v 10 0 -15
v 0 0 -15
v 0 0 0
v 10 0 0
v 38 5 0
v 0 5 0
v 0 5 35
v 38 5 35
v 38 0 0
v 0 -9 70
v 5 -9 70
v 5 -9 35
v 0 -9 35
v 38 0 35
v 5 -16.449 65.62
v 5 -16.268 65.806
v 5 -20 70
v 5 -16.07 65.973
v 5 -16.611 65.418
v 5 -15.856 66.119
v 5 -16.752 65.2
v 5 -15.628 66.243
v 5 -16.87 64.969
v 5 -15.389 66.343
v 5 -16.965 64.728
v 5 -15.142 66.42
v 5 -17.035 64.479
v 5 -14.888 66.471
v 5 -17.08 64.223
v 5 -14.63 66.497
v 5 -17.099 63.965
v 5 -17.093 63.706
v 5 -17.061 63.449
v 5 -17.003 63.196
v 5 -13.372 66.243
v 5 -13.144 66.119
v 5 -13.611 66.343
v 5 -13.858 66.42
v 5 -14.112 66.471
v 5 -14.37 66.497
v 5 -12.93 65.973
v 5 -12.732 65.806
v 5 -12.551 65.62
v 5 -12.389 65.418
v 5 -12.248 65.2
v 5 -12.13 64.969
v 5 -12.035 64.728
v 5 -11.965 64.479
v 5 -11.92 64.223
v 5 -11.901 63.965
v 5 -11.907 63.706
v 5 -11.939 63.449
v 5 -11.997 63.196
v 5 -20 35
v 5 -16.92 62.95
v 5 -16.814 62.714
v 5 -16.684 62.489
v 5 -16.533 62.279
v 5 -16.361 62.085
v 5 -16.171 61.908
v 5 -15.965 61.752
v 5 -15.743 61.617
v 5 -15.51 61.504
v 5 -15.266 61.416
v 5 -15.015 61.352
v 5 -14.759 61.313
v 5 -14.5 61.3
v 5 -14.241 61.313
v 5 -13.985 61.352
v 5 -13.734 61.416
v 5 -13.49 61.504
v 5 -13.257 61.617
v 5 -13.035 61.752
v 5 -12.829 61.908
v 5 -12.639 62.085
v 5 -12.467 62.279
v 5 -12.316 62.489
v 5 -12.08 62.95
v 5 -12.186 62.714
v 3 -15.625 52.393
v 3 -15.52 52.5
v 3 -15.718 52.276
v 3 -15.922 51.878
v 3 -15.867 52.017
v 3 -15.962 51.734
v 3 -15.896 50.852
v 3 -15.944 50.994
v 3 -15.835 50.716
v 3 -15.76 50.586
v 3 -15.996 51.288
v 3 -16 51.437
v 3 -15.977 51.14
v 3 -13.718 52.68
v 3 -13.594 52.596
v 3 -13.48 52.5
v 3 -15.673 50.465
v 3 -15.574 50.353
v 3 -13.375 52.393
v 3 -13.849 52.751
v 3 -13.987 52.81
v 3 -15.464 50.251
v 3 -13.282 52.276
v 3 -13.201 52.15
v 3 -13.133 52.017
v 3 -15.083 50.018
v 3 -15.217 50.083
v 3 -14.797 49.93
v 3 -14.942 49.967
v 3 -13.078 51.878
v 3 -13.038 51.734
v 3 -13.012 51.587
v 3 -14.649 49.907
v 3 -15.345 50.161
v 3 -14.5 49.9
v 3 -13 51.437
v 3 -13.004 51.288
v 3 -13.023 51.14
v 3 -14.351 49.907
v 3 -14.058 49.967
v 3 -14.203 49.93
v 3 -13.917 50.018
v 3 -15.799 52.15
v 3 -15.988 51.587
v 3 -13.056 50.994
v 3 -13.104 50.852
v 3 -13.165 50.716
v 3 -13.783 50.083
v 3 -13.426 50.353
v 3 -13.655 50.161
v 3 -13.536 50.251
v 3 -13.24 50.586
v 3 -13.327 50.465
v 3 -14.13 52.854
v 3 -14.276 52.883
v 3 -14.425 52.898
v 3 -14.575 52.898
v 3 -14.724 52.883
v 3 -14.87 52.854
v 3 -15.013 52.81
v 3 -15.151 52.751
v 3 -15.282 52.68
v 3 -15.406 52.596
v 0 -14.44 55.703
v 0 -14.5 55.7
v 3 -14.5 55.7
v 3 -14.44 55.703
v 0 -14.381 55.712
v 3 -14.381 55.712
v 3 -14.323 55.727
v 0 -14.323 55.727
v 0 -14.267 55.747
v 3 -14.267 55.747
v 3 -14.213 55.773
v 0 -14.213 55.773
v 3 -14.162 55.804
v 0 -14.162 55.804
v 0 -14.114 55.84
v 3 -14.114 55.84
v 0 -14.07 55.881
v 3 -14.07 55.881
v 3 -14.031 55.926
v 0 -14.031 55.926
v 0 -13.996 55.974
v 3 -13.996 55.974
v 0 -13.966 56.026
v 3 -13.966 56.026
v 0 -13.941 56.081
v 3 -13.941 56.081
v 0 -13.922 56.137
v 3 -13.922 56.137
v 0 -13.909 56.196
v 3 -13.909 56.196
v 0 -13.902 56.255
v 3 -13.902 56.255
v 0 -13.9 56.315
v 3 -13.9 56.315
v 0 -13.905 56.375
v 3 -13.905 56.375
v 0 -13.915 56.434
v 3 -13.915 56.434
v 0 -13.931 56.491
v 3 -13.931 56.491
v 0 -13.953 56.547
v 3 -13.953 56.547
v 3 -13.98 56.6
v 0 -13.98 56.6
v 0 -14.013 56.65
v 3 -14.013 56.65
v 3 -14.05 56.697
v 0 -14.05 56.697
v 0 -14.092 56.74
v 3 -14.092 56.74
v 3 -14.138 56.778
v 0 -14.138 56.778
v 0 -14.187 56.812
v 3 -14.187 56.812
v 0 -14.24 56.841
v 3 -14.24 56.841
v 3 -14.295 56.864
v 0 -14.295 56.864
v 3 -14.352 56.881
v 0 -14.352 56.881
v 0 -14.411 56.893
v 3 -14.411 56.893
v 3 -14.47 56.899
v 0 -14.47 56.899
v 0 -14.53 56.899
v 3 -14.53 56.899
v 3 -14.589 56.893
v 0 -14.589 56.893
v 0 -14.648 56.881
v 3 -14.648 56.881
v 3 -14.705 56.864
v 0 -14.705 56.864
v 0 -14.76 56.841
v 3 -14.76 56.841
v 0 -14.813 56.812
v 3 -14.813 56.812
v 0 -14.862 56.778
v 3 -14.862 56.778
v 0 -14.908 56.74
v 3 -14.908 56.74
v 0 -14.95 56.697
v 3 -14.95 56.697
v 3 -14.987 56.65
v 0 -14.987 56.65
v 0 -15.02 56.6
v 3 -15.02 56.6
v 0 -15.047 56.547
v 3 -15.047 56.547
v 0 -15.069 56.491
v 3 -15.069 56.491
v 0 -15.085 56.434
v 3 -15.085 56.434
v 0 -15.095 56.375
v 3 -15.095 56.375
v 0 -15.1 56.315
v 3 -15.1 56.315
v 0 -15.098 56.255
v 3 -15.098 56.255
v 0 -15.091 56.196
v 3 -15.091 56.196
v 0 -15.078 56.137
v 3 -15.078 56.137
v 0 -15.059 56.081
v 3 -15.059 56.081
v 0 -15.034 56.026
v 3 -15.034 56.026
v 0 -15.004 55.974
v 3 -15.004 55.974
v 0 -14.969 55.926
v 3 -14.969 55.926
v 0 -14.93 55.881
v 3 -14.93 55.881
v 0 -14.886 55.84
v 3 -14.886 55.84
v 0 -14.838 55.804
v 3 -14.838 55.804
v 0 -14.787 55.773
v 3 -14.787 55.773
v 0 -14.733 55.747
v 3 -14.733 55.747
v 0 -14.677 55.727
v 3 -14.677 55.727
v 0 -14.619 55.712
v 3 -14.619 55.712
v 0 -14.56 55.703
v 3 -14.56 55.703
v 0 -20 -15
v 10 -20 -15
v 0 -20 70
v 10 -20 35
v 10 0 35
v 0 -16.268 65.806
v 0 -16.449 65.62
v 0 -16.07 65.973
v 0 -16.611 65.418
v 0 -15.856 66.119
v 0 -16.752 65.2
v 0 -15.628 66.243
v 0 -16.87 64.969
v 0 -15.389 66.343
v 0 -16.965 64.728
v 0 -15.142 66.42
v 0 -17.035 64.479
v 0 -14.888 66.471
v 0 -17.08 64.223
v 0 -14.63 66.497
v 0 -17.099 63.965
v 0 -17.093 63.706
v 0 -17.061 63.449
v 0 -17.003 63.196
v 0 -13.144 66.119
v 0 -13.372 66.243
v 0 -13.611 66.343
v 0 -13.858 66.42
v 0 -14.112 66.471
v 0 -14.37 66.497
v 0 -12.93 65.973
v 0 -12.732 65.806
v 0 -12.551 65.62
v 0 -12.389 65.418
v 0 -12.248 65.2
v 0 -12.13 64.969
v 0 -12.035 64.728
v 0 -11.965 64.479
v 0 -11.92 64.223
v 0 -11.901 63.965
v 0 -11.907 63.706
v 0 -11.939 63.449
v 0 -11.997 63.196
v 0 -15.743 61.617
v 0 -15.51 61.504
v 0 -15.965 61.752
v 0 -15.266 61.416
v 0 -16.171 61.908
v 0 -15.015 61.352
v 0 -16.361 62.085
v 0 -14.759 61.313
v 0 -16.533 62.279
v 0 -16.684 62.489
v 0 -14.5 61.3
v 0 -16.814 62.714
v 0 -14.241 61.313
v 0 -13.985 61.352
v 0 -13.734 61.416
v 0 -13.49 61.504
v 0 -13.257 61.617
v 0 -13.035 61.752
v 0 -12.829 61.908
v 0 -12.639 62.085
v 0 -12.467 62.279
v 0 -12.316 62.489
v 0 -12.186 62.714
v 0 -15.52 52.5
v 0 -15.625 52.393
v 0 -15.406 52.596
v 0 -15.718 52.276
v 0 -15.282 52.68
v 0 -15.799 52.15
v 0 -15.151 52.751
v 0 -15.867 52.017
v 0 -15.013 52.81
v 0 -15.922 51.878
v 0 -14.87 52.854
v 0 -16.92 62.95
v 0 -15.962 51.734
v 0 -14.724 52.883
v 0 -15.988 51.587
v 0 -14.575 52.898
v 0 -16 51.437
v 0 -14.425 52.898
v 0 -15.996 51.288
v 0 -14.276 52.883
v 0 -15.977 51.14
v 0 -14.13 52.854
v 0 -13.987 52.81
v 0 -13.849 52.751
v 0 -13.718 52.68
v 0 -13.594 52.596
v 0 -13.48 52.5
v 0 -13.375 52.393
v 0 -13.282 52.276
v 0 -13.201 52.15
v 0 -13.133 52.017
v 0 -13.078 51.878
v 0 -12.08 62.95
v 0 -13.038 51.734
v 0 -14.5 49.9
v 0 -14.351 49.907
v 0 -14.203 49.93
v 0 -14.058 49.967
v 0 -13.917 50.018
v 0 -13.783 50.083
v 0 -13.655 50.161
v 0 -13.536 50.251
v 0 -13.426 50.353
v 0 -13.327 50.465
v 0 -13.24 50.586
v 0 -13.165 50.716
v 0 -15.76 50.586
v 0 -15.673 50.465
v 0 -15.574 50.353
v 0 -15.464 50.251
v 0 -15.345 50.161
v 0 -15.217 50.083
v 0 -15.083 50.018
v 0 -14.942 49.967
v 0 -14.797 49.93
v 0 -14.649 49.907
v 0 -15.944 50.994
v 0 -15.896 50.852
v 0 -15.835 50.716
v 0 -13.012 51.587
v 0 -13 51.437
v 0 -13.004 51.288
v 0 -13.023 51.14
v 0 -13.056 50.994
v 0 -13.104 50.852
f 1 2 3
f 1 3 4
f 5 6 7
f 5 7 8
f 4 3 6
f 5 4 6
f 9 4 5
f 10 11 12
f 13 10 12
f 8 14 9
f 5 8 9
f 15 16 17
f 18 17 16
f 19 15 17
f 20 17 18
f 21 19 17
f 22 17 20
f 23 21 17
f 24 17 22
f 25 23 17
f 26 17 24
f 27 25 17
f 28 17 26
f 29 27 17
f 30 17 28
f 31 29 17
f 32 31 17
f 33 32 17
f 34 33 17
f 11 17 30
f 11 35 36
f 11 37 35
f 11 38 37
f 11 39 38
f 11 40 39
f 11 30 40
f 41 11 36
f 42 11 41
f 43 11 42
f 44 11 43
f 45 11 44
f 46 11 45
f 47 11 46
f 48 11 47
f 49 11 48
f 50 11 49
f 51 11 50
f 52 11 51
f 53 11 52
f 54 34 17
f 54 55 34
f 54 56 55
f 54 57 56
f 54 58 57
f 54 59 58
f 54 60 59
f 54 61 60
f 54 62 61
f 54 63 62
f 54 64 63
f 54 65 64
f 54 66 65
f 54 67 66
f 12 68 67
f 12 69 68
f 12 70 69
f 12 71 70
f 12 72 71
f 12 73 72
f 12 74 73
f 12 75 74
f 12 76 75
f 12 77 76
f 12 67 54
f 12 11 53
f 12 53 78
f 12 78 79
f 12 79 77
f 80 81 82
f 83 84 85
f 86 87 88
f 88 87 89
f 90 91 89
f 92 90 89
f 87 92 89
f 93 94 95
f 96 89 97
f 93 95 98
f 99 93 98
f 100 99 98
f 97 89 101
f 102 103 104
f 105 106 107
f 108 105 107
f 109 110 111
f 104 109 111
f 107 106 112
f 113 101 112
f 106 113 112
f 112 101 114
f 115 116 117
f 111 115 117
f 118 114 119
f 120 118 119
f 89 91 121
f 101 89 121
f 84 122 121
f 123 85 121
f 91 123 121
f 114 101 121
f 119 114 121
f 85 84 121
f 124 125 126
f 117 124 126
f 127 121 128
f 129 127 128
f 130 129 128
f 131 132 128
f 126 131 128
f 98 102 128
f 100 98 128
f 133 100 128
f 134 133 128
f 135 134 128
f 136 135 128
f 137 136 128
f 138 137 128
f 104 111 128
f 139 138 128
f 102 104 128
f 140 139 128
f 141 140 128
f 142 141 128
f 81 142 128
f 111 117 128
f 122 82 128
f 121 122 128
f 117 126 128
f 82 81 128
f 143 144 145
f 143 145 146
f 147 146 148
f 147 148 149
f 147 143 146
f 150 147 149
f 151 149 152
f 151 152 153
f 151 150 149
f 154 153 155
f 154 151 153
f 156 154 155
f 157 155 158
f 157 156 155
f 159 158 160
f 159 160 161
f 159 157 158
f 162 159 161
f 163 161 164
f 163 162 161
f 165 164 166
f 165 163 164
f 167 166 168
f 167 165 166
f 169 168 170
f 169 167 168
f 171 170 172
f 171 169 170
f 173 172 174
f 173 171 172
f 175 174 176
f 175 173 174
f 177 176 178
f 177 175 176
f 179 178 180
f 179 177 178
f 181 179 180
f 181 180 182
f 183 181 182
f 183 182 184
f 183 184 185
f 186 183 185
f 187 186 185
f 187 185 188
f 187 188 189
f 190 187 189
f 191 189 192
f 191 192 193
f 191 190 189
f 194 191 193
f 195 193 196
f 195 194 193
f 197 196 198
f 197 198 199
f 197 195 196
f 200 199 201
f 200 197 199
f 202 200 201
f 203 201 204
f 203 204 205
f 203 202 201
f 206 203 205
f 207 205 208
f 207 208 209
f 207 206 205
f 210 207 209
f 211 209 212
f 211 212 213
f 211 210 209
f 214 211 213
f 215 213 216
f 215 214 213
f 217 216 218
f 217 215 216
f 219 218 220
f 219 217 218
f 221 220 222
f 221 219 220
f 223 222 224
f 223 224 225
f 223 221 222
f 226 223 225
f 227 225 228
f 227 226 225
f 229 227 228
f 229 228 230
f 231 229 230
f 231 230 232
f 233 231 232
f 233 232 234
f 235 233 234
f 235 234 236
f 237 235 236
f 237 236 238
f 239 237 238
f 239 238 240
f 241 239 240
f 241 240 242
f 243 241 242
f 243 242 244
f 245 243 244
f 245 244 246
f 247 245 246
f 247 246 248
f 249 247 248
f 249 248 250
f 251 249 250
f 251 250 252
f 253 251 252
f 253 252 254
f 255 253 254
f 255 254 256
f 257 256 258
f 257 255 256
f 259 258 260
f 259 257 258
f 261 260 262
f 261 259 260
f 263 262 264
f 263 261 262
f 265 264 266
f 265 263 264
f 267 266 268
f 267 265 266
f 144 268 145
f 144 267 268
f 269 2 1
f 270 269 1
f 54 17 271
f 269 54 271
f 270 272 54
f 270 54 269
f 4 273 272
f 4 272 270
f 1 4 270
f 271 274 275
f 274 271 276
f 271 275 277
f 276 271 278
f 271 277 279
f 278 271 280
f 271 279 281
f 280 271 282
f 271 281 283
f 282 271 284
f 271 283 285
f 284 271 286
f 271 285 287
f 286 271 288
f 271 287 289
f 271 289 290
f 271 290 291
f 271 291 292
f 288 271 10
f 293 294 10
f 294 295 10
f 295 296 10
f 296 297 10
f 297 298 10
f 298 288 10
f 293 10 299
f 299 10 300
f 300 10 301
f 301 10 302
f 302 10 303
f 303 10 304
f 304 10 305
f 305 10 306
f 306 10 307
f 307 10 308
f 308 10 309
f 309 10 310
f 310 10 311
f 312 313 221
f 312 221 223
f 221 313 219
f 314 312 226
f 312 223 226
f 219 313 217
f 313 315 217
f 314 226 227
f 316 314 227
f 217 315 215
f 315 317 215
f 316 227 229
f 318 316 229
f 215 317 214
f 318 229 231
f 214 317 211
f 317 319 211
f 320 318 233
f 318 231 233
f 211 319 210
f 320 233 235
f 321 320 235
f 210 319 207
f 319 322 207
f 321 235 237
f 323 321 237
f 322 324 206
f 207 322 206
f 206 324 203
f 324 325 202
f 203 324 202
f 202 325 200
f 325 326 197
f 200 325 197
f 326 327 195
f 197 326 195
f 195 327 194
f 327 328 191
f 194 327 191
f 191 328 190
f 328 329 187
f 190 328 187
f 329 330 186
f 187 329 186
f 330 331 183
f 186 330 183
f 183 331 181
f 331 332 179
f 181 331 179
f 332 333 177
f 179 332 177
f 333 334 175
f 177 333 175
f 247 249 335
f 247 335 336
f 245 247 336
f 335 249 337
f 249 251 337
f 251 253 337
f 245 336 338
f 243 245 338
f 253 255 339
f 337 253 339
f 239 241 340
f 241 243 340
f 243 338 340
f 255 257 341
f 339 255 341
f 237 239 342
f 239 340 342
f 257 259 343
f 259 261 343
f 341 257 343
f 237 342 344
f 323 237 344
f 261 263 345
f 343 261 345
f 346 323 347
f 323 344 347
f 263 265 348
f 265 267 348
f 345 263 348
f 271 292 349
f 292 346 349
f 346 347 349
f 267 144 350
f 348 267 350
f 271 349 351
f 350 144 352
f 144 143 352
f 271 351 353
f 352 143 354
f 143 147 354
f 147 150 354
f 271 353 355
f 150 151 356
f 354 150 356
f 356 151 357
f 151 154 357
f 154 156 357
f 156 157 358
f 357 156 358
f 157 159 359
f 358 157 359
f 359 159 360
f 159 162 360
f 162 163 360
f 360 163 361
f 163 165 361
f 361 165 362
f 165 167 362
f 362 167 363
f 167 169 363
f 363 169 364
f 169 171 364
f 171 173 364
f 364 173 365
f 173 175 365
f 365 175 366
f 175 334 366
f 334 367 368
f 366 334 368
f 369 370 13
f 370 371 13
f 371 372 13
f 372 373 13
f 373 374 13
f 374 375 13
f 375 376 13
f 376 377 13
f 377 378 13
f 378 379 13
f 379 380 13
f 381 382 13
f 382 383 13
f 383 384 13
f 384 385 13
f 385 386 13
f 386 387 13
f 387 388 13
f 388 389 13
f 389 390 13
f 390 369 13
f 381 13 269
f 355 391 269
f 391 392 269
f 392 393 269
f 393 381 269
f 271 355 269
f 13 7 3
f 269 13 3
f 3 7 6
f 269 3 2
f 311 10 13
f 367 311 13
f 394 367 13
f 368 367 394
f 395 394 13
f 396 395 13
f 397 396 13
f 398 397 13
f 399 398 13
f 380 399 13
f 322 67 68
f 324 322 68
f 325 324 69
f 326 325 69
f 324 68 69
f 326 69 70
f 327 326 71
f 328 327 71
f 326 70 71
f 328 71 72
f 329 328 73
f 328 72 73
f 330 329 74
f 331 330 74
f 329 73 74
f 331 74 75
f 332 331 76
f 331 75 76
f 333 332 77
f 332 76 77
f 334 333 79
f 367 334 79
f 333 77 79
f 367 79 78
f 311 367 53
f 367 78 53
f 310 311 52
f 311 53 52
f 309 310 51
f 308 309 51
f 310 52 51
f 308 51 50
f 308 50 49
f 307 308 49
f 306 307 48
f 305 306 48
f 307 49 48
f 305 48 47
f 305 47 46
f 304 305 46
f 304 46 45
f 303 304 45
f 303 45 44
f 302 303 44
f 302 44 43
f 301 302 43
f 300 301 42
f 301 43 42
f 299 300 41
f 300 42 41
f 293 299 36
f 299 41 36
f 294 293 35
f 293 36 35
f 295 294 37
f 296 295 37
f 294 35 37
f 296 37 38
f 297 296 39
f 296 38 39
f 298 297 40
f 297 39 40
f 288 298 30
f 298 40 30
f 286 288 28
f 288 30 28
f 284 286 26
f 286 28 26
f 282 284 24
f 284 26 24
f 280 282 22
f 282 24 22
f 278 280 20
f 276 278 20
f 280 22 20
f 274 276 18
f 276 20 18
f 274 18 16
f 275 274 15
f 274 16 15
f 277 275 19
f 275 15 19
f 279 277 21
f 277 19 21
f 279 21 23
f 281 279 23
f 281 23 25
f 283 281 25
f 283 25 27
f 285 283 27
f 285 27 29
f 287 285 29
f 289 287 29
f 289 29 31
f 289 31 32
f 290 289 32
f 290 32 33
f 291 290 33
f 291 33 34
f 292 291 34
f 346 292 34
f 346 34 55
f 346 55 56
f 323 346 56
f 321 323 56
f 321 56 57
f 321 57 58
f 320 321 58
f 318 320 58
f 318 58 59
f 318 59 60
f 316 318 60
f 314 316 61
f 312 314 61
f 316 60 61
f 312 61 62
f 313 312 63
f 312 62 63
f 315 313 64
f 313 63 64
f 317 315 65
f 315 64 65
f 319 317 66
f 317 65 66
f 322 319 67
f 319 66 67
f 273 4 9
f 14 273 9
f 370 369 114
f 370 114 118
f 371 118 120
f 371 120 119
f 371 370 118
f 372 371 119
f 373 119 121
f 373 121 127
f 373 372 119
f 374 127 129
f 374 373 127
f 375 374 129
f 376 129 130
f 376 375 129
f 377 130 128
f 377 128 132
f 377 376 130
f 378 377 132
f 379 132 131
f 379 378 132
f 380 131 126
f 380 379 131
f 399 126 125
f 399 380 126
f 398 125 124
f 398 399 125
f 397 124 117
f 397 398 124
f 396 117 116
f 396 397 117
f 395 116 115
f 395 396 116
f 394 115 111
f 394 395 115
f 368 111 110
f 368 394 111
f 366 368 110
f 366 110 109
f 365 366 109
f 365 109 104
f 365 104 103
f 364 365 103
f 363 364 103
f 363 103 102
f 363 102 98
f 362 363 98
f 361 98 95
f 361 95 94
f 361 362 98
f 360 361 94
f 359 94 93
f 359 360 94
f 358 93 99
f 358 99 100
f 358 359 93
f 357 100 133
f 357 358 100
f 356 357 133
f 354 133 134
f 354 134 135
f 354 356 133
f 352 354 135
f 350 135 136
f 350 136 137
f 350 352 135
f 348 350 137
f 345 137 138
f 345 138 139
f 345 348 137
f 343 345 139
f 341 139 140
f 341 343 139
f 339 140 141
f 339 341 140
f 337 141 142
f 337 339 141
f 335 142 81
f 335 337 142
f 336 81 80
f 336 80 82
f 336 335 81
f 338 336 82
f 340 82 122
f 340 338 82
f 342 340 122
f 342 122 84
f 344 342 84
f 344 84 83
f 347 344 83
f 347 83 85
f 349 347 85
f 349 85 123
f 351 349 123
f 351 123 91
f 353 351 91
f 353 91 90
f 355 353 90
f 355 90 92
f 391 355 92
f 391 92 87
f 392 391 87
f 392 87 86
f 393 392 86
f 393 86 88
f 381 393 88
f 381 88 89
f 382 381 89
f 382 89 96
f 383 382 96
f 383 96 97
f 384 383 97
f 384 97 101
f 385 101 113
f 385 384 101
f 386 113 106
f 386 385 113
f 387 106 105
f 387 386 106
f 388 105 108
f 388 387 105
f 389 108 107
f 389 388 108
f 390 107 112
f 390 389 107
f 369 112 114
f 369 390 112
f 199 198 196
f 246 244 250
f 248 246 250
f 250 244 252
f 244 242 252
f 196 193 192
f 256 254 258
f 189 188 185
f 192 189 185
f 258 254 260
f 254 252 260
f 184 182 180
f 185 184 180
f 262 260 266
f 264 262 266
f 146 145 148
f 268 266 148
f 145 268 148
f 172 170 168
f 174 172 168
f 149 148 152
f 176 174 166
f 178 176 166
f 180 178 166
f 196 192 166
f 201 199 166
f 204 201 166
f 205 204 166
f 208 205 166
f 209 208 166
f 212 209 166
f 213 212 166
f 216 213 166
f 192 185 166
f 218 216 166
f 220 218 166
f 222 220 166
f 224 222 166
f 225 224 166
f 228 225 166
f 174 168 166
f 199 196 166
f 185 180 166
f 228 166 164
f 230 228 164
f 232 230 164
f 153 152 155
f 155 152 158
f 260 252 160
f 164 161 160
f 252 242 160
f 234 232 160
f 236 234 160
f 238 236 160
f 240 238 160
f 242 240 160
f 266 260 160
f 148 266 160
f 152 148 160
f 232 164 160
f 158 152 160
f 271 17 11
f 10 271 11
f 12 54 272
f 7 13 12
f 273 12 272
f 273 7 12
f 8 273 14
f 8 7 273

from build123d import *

# Parameters (mm, degrees)
SKETCH_1_W          = 38
SKETCH_1_H          = 35
EXTRUDE_1_DEPTH     = 5
SKETCH_1_14_W       = 10
SKETCH_1_14_H       = 50
EXTRUDE_2_DEPTH     = 20
EXTRUDE_START       = -5
SKETCH_2_W          = 35
SKETCH_2_H          = 11
SKETCH_2_R          = 2.6
EXTRUDE_3_DEPTH     = 5
CUT_EXTRUDE_START   = -10
SKETCH_2_3_R        = 0.6
SKETCH_2_3_R_2      = 1.5
CUT_EXTRUDE_1_DEPTH = 3


with BuildPart() as part:
    # 草图1 → 凸台-拉伸1 (new body)
    with BuildSketch(Plane(origin=(0, 0, 0), x_dir=(1, 0, 0), z_dir=(0, 1, 0))):
        with Locations((19, -17.5)):
            Rectangle(SKETCH_1_W, SKETCH_1_H)
    extrude(amount=EXTRUDE_1_DEPTH)

    # 草图1<14> → 凸台-拉伸2 (add)
    with BuildSketch(Plane(origin=(0, 0, 0), x_dir=(1, 0, 0), z_dir=(0, 1, 0))):
        with Locations((5, -10)):
            Rectangle(SKETCH_1_14_W, SKETCH_1_14_H)
    extrude(amount=-EXTRUDE_2_DEPTH)

    # 草图2 → 凸台-拉伸3 (add)
    with BuildSketch(Plane(origin=(10, 0, 0), x_dir=(0, 0, -1), z_dir=(1, 0, 0)).offset(EXTRUDE_START)):
        with Locations((-52.5, -14.5)):
            Rectangle(SKETCH_2_W, SKETCH_2_H)
        with Locations((-63.9, -14.5)):
            Circle(SKETCH_2_R, mode=Mode.SUBTRACT)
    extrude(amount=-EXTRUDE_3_DEPTH)

    # 草图2<3> → 切除-拉伸1 (cut)
    with BuildSketch(Plane(origin=(10, 0, 0), x_dir=(0, 0, -1), z_dir=(1, 0, 0)).offset(CUT_EXTRUDE_START)):
        with Locations((-56.3, -14.5)):
            Circle(SKETCH_2_3_R)
        with Locations((-51.4, -14.5)):
            Circle(SKETCH_2_3_R_2)
    extrude(amount=CUT_EXTRUDE_1_DEPTH, mode=Mode.SUBTRACT)


solid = part.part
